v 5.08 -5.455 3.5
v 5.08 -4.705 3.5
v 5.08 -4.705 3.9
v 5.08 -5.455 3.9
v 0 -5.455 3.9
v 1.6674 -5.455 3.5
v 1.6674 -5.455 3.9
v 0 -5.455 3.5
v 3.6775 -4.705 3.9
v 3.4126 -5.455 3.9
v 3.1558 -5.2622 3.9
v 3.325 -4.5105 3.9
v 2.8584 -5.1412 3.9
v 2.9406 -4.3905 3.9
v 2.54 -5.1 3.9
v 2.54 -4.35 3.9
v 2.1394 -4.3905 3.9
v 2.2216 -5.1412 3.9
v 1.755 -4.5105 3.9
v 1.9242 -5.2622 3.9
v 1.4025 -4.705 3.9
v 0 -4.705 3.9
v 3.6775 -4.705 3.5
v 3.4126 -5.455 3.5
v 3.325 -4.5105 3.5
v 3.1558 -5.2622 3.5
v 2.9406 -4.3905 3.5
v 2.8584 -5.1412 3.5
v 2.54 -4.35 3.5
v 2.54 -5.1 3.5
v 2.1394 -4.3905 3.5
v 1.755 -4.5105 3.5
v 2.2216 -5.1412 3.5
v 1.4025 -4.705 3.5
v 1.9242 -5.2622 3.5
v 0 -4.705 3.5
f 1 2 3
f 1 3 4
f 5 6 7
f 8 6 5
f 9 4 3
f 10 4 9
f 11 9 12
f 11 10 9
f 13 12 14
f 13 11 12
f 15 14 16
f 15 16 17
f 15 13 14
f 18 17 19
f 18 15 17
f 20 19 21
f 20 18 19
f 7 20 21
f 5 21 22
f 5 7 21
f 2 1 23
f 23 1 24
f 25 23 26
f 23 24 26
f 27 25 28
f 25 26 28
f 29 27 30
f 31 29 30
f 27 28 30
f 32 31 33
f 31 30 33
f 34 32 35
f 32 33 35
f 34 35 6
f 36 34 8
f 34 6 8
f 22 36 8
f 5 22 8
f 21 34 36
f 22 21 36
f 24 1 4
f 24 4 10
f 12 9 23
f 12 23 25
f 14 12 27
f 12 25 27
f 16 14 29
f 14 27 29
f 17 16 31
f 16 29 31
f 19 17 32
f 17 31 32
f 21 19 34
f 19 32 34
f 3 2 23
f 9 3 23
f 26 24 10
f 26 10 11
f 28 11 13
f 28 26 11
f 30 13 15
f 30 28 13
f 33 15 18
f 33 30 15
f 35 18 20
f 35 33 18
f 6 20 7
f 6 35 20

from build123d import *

# Parameters (mm, degrees)
BOX007_W                  = 6
BOX007_H                  = 4
BOX007_DEPTH              = 0.4
CYLINDER006_R             = 1.25
CYLINDER006_DEPTH         = 0.4
CYLINDER005_R             = 2
CYLINDER005_DEPTH         = 0.4
BOX006_W                  = 5.08
BOX006_H                  = 0.75
BOX006_DEPTH              = 0.4
FUSION010_PLACEMENT_ANGLE = 180


with BuildPart() as cut_cube002:
    # Box007 → Box007 (new body)
    with BuildSketch(Plane(origin=(-3, 2.915, 0), x_dir=(1, 0, 0), z_dir=(0, 0, 1))):
        with Locations((3, 2)):
            Rectangle(BOX007_W, BOX007_H)
    extrude(amount=BOX007_DEPTH)


with BuildPart() as c_cut001:
    # Cylinder006 → Cylinder006 (new body)
    with BuildSketch(Plane(origin=(0, 3.81, 0), x_dir=(1, 0, 0), z_dir=(0, 0, 1))):
        Circle(CYLINDER006_R)
    extrude(amount=CYLINDER006_DEPTH)


with BuildPart() as cut009:
    # Cylinder005 → Cylinder005 (new body)
    with BuildSketch(Plane(origin=(0, 3.81, 0), x_dir=(1, 0, 0), z_dir=(0, 0, 1))):
        Circle(CYLINDER005_R)
    extrude(amount=CYLINDER005_DEPTH)

    # Cut008: cut C_cut001
    add(c_cut001.part, mode=Mode.SUBTRACT)

    # Cut009: cut cut_cube002
    add(cut_cube002.part, mode=Mode.SUBTRACT)


with BuildPart() as a_chip003:
    # Box006 → Box006 (new body)
    with BuildSketch(Plane(origin=(-2.54, 2.165, 0), x_dir=(1, 0, 0), z_dir=(0, 0, 1))):
        with Locations((2.54, 0.375)):
            Rectangle(BOX006_W, BOX006_H)
    extrude(amount=BOX006_DEPTH)

    # Cut007: cut C_cut001
    add(c_cut001.part, mode=Mode.SUBTRACT)

    # Fusion010: union Cut009
    add(cut009.part)


with BuildPart() as a_chip003_1:
    # Fusion010 placement: moved
    add(a_chip003.part.moved(Location((2.54, -2.54, 3.5))).rotate(Axis((2.54, -2.54, 3.5), (0, 0, 1)), FUSION010_PLACEMENT_ANGLE))


solid = a_chip003_1.part
